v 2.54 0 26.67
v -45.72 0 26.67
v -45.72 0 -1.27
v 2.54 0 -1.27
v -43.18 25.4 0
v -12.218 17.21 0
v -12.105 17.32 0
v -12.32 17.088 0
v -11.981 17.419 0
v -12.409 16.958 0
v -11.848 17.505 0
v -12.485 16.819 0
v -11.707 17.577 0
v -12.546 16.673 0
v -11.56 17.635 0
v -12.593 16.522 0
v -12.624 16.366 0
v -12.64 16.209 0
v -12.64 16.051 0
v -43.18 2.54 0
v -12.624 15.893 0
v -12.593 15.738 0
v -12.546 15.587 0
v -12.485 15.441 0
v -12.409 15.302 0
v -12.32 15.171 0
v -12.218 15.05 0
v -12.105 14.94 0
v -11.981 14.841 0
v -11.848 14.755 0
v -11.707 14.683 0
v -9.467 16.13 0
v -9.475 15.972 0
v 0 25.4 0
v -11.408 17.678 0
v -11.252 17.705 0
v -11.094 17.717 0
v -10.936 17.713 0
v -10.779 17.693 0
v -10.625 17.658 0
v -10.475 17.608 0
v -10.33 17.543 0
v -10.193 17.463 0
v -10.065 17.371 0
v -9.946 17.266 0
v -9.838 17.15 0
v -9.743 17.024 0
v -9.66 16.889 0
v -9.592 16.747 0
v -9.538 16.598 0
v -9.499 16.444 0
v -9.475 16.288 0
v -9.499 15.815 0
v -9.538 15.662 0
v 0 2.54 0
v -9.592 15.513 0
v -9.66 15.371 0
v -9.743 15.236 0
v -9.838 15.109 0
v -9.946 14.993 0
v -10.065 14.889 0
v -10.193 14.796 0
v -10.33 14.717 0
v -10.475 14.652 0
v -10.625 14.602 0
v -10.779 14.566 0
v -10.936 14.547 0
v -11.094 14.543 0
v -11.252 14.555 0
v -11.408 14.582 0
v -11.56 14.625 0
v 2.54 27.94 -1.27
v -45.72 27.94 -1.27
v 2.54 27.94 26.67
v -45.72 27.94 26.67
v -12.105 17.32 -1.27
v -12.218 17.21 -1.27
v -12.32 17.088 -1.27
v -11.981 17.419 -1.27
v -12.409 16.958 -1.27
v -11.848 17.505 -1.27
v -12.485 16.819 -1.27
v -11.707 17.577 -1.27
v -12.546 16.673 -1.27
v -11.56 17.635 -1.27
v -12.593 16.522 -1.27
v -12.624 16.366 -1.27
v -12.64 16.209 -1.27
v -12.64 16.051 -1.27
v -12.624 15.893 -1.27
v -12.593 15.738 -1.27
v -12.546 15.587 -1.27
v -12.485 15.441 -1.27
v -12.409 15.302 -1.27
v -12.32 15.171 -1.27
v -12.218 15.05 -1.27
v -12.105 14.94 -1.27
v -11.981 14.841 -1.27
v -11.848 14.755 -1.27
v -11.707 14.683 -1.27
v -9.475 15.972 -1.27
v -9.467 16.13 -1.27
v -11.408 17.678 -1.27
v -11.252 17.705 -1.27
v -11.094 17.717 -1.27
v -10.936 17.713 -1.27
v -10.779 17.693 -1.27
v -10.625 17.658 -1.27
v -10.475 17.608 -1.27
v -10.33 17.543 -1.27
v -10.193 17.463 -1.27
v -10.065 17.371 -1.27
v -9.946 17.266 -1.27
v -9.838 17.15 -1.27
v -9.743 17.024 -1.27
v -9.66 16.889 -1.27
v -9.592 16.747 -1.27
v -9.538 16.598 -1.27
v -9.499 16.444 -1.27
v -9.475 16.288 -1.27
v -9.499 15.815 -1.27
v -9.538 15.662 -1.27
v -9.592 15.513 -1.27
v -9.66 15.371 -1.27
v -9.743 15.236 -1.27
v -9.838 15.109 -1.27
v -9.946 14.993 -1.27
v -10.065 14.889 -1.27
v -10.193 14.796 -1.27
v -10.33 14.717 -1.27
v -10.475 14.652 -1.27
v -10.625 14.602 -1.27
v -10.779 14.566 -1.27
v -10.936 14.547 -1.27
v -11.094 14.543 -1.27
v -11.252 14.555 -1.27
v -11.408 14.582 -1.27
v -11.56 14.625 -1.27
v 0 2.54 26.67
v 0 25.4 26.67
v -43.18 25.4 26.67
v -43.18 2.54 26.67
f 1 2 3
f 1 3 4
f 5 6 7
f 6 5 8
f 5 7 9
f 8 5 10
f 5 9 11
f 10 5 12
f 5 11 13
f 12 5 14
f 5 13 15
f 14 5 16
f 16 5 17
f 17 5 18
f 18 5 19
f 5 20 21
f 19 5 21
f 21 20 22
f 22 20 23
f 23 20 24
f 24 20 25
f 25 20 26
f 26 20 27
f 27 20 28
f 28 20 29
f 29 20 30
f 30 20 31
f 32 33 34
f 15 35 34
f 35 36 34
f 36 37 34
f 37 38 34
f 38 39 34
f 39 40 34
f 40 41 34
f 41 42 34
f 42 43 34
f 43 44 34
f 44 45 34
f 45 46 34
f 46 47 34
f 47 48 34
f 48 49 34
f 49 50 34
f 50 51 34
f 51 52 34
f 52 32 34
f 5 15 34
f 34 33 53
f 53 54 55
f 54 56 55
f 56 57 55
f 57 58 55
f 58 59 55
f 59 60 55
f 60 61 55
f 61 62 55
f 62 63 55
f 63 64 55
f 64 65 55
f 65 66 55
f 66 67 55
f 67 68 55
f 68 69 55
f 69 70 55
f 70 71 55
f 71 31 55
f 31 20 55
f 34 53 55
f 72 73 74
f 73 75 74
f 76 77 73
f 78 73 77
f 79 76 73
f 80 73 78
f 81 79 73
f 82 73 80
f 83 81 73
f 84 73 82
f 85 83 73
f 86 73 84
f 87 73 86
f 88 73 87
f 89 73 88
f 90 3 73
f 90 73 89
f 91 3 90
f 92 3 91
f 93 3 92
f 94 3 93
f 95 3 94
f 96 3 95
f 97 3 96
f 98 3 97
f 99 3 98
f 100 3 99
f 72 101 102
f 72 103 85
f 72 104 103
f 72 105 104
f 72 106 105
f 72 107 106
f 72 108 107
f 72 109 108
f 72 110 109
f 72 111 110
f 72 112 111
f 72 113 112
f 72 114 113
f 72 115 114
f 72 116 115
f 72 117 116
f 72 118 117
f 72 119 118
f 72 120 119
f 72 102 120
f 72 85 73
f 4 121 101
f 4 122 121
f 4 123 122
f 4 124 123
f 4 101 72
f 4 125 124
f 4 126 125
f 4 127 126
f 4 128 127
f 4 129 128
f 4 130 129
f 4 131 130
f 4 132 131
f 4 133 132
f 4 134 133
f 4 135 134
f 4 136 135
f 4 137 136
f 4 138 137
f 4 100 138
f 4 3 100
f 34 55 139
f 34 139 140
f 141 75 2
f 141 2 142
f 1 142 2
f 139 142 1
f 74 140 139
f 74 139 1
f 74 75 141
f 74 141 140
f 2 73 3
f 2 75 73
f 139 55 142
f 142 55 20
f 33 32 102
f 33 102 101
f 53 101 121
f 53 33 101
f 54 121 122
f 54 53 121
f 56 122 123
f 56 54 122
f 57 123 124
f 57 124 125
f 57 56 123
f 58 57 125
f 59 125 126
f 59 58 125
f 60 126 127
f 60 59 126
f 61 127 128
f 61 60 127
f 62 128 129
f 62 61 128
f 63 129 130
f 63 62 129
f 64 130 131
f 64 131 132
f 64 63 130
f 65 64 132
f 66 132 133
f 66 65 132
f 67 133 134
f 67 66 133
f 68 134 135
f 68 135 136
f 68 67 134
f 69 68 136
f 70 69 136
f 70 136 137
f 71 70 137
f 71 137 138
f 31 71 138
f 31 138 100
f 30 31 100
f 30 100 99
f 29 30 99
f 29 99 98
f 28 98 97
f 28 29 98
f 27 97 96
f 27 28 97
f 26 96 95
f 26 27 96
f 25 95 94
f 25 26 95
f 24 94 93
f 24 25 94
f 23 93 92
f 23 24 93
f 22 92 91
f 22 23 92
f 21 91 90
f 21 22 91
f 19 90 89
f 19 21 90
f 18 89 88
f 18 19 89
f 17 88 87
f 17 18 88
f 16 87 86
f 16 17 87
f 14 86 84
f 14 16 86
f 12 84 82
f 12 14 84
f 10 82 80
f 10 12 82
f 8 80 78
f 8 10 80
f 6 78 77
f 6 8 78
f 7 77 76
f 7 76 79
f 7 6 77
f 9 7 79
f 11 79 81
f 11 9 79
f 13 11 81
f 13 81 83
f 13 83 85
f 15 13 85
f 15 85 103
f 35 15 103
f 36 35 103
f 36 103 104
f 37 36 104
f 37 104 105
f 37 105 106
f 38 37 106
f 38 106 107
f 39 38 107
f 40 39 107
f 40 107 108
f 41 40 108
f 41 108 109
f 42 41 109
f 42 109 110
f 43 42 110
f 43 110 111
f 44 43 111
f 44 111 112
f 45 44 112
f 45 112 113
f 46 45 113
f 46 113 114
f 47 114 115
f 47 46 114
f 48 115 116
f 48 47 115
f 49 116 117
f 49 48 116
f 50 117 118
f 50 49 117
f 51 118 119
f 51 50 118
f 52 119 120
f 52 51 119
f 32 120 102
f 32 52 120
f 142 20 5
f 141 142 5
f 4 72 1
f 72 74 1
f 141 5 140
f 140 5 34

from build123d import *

# Parameters (mm, degrees)
F0_W     = 43.18
F0_H     = 2.54
F0_W_2   = 2.54
F0_H_2   = 22.86
F1_DEPTH = 26.67
F2_W     = 48.26
F2_H     = 27.94
F2_R     = 1.5875
F3_DEPTH = 1.27


with BuildPart() as f1:
    # F0 (on Top) → F1 (new body)
    with BuildSketch(Plane.XY):
        with Locations((-21.59, 26.67)):
            Rectangle(F0_W, F0_H)
        with Locations((-44.45, 26.67)):
            Rectangle(F0_W_2, F0_H)
        with Locations((-44.45, 13.97)):
            Rectangle(F0_W_2, F0_H_2)
        with Locations((-44.45, 1.27)):
            Rectangle(F0_W_2, F0_H)
        with Locations((-21.59, 1.27)):
            Rectangle(F0_W, F0_H)
        with Locations((1.27, 1.27)):
            Rectangle(F0_W_2, F0_H)
        with Locations((1.27, 13.97)):
            Rectangle(F0_W_2, F0_H_2)
        with Locations((1.27, 26.67)):
            Rectangle(F0_W_2, F0_H)
    extrude(amount=F1_DEPTH)

    # F2 (on face) → F3 (join)
    with BuildSketch(Plane(origin=(0, 0, 0), x_dir=(1, 0, 0), z_dir=(0, 0, -1))):
        with Locations((-21.59, -13.97)):
            Rectangle(F2_W, F2_H)
        with Locations((-11.054569, -16.12987)):
            Circle(F2_R, mode=Mode.SUBTRACT)
    extrude(amount=F3_DEPTH)


solid = f1.part
